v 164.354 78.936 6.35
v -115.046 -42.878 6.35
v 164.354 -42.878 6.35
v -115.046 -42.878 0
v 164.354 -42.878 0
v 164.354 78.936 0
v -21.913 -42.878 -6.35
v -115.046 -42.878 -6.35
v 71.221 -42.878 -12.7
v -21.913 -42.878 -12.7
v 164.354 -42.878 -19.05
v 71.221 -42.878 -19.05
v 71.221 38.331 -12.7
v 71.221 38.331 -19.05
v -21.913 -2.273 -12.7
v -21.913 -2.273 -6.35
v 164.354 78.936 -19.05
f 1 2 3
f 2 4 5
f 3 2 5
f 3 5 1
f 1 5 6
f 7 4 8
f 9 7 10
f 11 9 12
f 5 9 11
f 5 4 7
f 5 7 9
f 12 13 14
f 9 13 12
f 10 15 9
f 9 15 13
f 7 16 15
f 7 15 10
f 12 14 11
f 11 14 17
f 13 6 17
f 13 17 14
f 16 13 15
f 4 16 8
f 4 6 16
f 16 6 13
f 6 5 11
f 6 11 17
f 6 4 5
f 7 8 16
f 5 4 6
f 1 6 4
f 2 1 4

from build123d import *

# Parameters (mm, degrees)
F2_DEPTH = 6.35
F3_DEPTH = 6.35
F4_DEPTH = 12.7
F5_DEPTH = 19.05


with BuildPart() as f2:
    # F0 (on Top) → F2 (new body)
    with BuildSketch(Plane.XY):
        Polygon((164.3541202068, 78.9359754823), (-115.0458797932, -42.8781452098), (164.3541202068, -42.8781452098), align=None)
    extrude(amount=F2_DEPTH)


with BuildPart() as f3:
    # F1 (on face) → F3 (new body)
    with BuildSketch(Plane.XY):
        Polygon((-21.9125464598, -42.8781452098), (-21.9125464598, -2.2734383124), (-115.0458797932, -42.8781452098), align=None)
    extrude(amount=-F3_DEPTH)

    # F1 (on face) → F4 (join)
    with BuildSketch(Plane.XY):
        Polygon((71.2207868735, -42.8781452098), (71.2207868735, 38.331268585), (-21.9125464598, -2.2734383124), (-21.9125464598, -42.8781452098), align=None)
    extrude(amount=-F4_DEPTH)

    # F1 (on face) → F5 (join)
    with BuildSketch(Plane.XY):
        Polygon((164.3541202068, -42.8781452098), (164.3541202068, 78.9359754823), (71.2207868735, 38.331268585), (71.2207868735, -42.8781452098), align=None)
    extrude(amount=-F5_DEPTH)


solid = Compound([f2.part, f3.part])
